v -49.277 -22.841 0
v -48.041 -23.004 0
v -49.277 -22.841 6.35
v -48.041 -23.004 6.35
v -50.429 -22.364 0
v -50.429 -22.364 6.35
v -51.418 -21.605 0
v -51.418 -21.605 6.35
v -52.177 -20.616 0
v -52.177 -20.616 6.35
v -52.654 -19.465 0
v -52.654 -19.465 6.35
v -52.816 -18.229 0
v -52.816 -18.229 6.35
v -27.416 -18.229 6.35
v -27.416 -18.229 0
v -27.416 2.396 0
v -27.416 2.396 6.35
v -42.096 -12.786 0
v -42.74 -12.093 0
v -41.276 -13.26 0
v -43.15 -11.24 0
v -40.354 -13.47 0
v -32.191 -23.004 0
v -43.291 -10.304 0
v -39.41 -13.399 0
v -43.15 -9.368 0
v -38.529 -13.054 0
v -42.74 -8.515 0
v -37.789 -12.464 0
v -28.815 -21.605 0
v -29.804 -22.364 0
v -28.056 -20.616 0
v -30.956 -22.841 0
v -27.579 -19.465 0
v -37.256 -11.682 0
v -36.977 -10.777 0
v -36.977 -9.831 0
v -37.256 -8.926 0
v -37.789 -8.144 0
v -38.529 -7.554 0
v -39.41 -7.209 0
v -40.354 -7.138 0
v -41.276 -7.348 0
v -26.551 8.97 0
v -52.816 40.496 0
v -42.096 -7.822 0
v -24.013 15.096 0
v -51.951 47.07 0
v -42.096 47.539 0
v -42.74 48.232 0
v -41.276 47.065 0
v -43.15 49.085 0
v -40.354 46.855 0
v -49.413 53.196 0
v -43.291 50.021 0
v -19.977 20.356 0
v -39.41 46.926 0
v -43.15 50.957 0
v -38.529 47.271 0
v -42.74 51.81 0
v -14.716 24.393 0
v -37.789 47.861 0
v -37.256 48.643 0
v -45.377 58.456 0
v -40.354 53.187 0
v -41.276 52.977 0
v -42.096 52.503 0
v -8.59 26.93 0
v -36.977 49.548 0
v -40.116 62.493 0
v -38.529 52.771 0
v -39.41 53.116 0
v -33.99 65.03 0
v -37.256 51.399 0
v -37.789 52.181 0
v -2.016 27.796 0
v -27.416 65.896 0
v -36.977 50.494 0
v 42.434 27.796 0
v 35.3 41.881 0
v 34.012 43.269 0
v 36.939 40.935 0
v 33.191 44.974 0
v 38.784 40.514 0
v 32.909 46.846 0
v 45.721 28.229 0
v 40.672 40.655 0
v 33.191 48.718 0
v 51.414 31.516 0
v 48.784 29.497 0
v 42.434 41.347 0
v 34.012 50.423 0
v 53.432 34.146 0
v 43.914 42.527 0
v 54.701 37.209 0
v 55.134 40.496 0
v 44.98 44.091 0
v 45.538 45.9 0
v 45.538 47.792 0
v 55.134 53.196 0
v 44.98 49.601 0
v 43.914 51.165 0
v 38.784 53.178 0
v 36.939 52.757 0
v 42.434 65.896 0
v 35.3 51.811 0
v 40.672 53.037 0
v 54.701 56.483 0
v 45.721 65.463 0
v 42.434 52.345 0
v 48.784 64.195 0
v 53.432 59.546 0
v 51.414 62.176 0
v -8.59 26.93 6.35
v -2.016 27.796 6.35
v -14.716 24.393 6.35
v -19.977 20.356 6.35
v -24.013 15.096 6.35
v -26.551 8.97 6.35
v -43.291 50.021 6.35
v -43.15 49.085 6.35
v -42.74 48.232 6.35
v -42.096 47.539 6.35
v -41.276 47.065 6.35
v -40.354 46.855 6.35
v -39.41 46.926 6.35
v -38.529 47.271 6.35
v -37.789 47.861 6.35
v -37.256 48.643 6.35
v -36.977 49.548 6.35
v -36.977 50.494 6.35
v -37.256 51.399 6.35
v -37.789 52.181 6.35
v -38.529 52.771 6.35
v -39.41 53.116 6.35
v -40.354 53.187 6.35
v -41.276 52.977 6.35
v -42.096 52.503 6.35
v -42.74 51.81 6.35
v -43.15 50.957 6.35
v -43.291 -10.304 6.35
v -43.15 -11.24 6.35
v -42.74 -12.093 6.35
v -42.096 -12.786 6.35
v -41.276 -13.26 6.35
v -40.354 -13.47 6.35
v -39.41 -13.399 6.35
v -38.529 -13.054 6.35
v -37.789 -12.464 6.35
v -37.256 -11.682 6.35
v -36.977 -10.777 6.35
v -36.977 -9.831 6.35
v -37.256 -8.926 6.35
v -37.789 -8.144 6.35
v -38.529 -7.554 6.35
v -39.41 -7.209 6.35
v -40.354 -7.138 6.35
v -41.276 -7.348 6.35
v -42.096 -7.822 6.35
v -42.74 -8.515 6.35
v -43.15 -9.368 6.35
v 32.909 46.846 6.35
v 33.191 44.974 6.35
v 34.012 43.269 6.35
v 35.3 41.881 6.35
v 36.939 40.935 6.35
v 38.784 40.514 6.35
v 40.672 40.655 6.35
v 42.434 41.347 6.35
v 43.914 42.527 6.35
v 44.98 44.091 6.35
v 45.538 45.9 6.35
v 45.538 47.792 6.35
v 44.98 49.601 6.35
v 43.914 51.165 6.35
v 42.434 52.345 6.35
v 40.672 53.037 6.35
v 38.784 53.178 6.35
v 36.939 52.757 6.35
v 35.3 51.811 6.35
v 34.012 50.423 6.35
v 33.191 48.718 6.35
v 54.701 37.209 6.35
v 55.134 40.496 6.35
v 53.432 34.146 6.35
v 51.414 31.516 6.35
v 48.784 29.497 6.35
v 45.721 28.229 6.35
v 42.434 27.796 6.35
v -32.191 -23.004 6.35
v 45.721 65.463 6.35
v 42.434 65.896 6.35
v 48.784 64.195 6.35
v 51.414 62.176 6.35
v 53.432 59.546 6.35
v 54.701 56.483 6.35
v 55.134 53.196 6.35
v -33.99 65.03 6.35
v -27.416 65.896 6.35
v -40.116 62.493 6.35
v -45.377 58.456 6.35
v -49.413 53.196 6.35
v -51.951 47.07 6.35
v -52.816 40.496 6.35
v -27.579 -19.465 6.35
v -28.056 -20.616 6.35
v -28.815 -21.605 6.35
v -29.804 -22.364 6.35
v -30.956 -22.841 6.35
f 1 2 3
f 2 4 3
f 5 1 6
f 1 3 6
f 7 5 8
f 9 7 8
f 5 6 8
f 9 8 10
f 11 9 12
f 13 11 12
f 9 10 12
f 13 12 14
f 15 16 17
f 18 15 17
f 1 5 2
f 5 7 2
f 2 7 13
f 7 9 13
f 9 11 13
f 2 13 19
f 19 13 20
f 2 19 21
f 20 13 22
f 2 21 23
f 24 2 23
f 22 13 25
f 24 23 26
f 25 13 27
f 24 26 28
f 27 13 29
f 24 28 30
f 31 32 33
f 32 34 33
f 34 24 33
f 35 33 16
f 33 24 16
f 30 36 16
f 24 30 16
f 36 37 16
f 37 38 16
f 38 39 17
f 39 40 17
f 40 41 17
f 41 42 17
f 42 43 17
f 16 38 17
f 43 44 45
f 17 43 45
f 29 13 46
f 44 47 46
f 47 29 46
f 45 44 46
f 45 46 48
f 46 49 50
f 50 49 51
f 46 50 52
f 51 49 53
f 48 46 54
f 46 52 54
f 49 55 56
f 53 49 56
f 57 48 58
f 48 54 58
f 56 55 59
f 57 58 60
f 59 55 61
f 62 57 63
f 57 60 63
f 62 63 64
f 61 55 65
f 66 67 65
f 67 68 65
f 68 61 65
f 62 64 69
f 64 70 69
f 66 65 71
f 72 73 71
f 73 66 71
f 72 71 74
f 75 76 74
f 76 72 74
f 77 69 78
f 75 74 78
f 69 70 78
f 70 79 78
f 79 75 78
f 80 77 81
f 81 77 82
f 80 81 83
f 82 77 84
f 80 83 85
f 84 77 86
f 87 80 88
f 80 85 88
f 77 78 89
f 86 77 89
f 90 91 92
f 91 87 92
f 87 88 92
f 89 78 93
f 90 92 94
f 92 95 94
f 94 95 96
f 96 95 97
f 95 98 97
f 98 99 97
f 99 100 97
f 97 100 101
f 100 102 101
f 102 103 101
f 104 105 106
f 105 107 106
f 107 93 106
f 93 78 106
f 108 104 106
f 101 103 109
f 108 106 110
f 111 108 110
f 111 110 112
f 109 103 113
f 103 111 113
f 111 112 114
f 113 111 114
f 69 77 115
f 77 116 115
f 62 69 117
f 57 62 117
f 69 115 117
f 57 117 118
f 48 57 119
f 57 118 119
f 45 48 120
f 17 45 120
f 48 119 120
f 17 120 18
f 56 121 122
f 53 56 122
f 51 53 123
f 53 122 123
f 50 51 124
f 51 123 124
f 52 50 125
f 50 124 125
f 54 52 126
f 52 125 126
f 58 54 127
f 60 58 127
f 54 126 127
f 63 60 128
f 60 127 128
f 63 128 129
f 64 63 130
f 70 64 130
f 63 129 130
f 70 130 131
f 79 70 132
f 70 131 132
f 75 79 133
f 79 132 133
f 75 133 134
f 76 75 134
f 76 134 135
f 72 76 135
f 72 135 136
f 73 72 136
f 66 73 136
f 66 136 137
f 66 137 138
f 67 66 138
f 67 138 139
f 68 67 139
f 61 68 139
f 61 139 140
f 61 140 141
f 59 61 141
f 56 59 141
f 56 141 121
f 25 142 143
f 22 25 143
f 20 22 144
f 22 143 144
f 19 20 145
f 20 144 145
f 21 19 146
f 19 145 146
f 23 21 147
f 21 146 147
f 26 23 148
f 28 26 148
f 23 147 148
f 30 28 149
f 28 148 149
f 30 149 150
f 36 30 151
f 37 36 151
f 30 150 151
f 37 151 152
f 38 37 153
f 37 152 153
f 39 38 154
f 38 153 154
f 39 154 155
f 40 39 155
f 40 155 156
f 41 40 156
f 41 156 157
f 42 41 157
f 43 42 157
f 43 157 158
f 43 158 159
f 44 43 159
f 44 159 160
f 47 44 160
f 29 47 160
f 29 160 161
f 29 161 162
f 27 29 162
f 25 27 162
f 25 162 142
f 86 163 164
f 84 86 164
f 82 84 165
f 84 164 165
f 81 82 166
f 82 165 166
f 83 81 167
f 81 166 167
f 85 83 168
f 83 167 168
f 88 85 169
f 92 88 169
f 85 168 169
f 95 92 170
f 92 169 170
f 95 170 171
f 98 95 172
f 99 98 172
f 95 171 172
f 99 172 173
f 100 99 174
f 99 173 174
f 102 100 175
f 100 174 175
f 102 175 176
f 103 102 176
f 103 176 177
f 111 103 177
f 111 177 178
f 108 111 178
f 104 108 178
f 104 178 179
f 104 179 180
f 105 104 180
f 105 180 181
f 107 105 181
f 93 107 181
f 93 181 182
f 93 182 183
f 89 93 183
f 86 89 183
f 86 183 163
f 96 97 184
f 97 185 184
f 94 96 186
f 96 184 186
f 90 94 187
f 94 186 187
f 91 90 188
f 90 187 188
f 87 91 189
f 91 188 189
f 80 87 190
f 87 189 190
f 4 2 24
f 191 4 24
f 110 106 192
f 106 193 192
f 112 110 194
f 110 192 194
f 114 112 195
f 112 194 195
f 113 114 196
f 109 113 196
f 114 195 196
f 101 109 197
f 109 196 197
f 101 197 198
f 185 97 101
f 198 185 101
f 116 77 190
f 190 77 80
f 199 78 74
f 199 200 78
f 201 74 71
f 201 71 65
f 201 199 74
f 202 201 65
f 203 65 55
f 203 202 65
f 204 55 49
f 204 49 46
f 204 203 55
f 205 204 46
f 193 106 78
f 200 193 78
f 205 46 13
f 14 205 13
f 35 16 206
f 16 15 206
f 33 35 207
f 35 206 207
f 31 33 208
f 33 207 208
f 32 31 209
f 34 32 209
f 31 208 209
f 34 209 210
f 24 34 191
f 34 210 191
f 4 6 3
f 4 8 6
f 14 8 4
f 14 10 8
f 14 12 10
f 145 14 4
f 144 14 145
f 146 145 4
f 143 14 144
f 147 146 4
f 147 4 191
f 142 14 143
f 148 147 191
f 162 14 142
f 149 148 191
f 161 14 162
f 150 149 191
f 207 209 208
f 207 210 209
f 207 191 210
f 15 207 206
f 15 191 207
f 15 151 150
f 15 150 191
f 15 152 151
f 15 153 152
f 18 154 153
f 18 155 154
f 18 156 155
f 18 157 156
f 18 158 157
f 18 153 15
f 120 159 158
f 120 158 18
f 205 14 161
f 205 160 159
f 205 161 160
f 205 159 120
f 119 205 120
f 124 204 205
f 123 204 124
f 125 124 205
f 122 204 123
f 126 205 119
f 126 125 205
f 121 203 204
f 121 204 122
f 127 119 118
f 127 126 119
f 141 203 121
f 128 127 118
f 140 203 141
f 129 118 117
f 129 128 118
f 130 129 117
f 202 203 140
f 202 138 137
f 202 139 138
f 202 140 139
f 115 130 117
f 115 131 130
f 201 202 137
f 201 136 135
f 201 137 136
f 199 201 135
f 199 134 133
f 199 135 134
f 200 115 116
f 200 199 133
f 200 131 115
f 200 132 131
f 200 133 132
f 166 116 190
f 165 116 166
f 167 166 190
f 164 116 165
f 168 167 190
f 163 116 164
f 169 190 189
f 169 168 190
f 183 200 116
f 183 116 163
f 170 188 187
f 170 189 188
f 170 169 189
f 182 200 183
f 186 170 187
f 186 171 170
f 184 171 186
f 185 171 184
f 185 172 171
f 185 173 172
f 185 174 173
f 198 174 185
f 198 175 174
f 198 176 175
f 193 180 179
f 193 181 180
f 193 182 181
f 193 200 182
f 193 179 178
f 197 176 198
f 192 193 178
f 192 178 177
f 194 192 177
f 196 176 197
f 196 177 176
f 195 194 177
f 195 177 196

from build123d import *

# Parameters (mm, degrees)
F1_DEPTH = 6.35
F2_R     = 25.4
F3_R     = 12.7
F4_R     = 25.4
F5_R     = 4.7752
F7_D     = 12.7
F9_D     = 6.35
F11_D    = 6.35


with BuildPart() as f1:
    # F0 (on Top) → F1 (new body)
    with BuildSketch(Plane.XY):
        Polygon((55.1337133169, 65.8959785044), (-52.8162866831, 65.8959785044), (-52.8162866831, -23.0040214956), (-27.4162866831, -23.0040214956), (-27.4162866831, 27.7959785044), (55.1337133169, 27.7959785044), align=None)
    extrude(amount=F1_DEPTH)

    # F2
    f2_edges = [f1.edges().sort_by_distance(p)[0] for p in [
        (-52.816287, 65.895979, 3.175),
    ]]
    fillet(f2_edges, radius=F2_R)

    # F3
    f3_edges = [f1.edges().sort_by_distance(p)[0] for p in [
        (55.133713, 65.895979, 3.175),
        (55.133713, 27.795979, 3.175),
    ]]
    fillet(f3_edges, radius=F3_R)

    # F4
    f4_edges = [f1.edges().sort_by_distance(p)[0] for p in [
        (-27.416287, 27.795979, 3.175),
    ]]
    fillet(f4_edges, radius=F4_R)

    # F5
    f5_edges = [f1.edges().sort_by_distance(p)[0] for p in [
        (-27.416287, -23.004021, 3.175),
        (-52.816287, -23.004021, 3.175),
    ]]
    fillet(f5_edges, radius=F5_R)

    # F7 (through all)
    with Locations(Plane(origin=(0, 0, 0), x_dir=(1, 0, 0), z_dir=(0, 0, -1))):
        with Locations((39.2587133169, -46.8459785044)):
            Hole(F7_D / 2)

    # F9 (through all)
    with Locations(Plane(origin=(0, 0, 0), x_dir=(1, 0, 0), z_dir=(0, 0, -1))):
        with Locations((-40.1162866831, 10.3040214956)):
            Hole(F9_D / 2)

    # F11 (through all)
    with Locations(Plane(origin=(0, 0, 0), x_dir=(1, 0, 0), z_dir=(0, 0, -1))):
        with Locations((-40.1162866831, -50.0209785044)):
            Hole(F11_D / 2)


solid = f1.part
